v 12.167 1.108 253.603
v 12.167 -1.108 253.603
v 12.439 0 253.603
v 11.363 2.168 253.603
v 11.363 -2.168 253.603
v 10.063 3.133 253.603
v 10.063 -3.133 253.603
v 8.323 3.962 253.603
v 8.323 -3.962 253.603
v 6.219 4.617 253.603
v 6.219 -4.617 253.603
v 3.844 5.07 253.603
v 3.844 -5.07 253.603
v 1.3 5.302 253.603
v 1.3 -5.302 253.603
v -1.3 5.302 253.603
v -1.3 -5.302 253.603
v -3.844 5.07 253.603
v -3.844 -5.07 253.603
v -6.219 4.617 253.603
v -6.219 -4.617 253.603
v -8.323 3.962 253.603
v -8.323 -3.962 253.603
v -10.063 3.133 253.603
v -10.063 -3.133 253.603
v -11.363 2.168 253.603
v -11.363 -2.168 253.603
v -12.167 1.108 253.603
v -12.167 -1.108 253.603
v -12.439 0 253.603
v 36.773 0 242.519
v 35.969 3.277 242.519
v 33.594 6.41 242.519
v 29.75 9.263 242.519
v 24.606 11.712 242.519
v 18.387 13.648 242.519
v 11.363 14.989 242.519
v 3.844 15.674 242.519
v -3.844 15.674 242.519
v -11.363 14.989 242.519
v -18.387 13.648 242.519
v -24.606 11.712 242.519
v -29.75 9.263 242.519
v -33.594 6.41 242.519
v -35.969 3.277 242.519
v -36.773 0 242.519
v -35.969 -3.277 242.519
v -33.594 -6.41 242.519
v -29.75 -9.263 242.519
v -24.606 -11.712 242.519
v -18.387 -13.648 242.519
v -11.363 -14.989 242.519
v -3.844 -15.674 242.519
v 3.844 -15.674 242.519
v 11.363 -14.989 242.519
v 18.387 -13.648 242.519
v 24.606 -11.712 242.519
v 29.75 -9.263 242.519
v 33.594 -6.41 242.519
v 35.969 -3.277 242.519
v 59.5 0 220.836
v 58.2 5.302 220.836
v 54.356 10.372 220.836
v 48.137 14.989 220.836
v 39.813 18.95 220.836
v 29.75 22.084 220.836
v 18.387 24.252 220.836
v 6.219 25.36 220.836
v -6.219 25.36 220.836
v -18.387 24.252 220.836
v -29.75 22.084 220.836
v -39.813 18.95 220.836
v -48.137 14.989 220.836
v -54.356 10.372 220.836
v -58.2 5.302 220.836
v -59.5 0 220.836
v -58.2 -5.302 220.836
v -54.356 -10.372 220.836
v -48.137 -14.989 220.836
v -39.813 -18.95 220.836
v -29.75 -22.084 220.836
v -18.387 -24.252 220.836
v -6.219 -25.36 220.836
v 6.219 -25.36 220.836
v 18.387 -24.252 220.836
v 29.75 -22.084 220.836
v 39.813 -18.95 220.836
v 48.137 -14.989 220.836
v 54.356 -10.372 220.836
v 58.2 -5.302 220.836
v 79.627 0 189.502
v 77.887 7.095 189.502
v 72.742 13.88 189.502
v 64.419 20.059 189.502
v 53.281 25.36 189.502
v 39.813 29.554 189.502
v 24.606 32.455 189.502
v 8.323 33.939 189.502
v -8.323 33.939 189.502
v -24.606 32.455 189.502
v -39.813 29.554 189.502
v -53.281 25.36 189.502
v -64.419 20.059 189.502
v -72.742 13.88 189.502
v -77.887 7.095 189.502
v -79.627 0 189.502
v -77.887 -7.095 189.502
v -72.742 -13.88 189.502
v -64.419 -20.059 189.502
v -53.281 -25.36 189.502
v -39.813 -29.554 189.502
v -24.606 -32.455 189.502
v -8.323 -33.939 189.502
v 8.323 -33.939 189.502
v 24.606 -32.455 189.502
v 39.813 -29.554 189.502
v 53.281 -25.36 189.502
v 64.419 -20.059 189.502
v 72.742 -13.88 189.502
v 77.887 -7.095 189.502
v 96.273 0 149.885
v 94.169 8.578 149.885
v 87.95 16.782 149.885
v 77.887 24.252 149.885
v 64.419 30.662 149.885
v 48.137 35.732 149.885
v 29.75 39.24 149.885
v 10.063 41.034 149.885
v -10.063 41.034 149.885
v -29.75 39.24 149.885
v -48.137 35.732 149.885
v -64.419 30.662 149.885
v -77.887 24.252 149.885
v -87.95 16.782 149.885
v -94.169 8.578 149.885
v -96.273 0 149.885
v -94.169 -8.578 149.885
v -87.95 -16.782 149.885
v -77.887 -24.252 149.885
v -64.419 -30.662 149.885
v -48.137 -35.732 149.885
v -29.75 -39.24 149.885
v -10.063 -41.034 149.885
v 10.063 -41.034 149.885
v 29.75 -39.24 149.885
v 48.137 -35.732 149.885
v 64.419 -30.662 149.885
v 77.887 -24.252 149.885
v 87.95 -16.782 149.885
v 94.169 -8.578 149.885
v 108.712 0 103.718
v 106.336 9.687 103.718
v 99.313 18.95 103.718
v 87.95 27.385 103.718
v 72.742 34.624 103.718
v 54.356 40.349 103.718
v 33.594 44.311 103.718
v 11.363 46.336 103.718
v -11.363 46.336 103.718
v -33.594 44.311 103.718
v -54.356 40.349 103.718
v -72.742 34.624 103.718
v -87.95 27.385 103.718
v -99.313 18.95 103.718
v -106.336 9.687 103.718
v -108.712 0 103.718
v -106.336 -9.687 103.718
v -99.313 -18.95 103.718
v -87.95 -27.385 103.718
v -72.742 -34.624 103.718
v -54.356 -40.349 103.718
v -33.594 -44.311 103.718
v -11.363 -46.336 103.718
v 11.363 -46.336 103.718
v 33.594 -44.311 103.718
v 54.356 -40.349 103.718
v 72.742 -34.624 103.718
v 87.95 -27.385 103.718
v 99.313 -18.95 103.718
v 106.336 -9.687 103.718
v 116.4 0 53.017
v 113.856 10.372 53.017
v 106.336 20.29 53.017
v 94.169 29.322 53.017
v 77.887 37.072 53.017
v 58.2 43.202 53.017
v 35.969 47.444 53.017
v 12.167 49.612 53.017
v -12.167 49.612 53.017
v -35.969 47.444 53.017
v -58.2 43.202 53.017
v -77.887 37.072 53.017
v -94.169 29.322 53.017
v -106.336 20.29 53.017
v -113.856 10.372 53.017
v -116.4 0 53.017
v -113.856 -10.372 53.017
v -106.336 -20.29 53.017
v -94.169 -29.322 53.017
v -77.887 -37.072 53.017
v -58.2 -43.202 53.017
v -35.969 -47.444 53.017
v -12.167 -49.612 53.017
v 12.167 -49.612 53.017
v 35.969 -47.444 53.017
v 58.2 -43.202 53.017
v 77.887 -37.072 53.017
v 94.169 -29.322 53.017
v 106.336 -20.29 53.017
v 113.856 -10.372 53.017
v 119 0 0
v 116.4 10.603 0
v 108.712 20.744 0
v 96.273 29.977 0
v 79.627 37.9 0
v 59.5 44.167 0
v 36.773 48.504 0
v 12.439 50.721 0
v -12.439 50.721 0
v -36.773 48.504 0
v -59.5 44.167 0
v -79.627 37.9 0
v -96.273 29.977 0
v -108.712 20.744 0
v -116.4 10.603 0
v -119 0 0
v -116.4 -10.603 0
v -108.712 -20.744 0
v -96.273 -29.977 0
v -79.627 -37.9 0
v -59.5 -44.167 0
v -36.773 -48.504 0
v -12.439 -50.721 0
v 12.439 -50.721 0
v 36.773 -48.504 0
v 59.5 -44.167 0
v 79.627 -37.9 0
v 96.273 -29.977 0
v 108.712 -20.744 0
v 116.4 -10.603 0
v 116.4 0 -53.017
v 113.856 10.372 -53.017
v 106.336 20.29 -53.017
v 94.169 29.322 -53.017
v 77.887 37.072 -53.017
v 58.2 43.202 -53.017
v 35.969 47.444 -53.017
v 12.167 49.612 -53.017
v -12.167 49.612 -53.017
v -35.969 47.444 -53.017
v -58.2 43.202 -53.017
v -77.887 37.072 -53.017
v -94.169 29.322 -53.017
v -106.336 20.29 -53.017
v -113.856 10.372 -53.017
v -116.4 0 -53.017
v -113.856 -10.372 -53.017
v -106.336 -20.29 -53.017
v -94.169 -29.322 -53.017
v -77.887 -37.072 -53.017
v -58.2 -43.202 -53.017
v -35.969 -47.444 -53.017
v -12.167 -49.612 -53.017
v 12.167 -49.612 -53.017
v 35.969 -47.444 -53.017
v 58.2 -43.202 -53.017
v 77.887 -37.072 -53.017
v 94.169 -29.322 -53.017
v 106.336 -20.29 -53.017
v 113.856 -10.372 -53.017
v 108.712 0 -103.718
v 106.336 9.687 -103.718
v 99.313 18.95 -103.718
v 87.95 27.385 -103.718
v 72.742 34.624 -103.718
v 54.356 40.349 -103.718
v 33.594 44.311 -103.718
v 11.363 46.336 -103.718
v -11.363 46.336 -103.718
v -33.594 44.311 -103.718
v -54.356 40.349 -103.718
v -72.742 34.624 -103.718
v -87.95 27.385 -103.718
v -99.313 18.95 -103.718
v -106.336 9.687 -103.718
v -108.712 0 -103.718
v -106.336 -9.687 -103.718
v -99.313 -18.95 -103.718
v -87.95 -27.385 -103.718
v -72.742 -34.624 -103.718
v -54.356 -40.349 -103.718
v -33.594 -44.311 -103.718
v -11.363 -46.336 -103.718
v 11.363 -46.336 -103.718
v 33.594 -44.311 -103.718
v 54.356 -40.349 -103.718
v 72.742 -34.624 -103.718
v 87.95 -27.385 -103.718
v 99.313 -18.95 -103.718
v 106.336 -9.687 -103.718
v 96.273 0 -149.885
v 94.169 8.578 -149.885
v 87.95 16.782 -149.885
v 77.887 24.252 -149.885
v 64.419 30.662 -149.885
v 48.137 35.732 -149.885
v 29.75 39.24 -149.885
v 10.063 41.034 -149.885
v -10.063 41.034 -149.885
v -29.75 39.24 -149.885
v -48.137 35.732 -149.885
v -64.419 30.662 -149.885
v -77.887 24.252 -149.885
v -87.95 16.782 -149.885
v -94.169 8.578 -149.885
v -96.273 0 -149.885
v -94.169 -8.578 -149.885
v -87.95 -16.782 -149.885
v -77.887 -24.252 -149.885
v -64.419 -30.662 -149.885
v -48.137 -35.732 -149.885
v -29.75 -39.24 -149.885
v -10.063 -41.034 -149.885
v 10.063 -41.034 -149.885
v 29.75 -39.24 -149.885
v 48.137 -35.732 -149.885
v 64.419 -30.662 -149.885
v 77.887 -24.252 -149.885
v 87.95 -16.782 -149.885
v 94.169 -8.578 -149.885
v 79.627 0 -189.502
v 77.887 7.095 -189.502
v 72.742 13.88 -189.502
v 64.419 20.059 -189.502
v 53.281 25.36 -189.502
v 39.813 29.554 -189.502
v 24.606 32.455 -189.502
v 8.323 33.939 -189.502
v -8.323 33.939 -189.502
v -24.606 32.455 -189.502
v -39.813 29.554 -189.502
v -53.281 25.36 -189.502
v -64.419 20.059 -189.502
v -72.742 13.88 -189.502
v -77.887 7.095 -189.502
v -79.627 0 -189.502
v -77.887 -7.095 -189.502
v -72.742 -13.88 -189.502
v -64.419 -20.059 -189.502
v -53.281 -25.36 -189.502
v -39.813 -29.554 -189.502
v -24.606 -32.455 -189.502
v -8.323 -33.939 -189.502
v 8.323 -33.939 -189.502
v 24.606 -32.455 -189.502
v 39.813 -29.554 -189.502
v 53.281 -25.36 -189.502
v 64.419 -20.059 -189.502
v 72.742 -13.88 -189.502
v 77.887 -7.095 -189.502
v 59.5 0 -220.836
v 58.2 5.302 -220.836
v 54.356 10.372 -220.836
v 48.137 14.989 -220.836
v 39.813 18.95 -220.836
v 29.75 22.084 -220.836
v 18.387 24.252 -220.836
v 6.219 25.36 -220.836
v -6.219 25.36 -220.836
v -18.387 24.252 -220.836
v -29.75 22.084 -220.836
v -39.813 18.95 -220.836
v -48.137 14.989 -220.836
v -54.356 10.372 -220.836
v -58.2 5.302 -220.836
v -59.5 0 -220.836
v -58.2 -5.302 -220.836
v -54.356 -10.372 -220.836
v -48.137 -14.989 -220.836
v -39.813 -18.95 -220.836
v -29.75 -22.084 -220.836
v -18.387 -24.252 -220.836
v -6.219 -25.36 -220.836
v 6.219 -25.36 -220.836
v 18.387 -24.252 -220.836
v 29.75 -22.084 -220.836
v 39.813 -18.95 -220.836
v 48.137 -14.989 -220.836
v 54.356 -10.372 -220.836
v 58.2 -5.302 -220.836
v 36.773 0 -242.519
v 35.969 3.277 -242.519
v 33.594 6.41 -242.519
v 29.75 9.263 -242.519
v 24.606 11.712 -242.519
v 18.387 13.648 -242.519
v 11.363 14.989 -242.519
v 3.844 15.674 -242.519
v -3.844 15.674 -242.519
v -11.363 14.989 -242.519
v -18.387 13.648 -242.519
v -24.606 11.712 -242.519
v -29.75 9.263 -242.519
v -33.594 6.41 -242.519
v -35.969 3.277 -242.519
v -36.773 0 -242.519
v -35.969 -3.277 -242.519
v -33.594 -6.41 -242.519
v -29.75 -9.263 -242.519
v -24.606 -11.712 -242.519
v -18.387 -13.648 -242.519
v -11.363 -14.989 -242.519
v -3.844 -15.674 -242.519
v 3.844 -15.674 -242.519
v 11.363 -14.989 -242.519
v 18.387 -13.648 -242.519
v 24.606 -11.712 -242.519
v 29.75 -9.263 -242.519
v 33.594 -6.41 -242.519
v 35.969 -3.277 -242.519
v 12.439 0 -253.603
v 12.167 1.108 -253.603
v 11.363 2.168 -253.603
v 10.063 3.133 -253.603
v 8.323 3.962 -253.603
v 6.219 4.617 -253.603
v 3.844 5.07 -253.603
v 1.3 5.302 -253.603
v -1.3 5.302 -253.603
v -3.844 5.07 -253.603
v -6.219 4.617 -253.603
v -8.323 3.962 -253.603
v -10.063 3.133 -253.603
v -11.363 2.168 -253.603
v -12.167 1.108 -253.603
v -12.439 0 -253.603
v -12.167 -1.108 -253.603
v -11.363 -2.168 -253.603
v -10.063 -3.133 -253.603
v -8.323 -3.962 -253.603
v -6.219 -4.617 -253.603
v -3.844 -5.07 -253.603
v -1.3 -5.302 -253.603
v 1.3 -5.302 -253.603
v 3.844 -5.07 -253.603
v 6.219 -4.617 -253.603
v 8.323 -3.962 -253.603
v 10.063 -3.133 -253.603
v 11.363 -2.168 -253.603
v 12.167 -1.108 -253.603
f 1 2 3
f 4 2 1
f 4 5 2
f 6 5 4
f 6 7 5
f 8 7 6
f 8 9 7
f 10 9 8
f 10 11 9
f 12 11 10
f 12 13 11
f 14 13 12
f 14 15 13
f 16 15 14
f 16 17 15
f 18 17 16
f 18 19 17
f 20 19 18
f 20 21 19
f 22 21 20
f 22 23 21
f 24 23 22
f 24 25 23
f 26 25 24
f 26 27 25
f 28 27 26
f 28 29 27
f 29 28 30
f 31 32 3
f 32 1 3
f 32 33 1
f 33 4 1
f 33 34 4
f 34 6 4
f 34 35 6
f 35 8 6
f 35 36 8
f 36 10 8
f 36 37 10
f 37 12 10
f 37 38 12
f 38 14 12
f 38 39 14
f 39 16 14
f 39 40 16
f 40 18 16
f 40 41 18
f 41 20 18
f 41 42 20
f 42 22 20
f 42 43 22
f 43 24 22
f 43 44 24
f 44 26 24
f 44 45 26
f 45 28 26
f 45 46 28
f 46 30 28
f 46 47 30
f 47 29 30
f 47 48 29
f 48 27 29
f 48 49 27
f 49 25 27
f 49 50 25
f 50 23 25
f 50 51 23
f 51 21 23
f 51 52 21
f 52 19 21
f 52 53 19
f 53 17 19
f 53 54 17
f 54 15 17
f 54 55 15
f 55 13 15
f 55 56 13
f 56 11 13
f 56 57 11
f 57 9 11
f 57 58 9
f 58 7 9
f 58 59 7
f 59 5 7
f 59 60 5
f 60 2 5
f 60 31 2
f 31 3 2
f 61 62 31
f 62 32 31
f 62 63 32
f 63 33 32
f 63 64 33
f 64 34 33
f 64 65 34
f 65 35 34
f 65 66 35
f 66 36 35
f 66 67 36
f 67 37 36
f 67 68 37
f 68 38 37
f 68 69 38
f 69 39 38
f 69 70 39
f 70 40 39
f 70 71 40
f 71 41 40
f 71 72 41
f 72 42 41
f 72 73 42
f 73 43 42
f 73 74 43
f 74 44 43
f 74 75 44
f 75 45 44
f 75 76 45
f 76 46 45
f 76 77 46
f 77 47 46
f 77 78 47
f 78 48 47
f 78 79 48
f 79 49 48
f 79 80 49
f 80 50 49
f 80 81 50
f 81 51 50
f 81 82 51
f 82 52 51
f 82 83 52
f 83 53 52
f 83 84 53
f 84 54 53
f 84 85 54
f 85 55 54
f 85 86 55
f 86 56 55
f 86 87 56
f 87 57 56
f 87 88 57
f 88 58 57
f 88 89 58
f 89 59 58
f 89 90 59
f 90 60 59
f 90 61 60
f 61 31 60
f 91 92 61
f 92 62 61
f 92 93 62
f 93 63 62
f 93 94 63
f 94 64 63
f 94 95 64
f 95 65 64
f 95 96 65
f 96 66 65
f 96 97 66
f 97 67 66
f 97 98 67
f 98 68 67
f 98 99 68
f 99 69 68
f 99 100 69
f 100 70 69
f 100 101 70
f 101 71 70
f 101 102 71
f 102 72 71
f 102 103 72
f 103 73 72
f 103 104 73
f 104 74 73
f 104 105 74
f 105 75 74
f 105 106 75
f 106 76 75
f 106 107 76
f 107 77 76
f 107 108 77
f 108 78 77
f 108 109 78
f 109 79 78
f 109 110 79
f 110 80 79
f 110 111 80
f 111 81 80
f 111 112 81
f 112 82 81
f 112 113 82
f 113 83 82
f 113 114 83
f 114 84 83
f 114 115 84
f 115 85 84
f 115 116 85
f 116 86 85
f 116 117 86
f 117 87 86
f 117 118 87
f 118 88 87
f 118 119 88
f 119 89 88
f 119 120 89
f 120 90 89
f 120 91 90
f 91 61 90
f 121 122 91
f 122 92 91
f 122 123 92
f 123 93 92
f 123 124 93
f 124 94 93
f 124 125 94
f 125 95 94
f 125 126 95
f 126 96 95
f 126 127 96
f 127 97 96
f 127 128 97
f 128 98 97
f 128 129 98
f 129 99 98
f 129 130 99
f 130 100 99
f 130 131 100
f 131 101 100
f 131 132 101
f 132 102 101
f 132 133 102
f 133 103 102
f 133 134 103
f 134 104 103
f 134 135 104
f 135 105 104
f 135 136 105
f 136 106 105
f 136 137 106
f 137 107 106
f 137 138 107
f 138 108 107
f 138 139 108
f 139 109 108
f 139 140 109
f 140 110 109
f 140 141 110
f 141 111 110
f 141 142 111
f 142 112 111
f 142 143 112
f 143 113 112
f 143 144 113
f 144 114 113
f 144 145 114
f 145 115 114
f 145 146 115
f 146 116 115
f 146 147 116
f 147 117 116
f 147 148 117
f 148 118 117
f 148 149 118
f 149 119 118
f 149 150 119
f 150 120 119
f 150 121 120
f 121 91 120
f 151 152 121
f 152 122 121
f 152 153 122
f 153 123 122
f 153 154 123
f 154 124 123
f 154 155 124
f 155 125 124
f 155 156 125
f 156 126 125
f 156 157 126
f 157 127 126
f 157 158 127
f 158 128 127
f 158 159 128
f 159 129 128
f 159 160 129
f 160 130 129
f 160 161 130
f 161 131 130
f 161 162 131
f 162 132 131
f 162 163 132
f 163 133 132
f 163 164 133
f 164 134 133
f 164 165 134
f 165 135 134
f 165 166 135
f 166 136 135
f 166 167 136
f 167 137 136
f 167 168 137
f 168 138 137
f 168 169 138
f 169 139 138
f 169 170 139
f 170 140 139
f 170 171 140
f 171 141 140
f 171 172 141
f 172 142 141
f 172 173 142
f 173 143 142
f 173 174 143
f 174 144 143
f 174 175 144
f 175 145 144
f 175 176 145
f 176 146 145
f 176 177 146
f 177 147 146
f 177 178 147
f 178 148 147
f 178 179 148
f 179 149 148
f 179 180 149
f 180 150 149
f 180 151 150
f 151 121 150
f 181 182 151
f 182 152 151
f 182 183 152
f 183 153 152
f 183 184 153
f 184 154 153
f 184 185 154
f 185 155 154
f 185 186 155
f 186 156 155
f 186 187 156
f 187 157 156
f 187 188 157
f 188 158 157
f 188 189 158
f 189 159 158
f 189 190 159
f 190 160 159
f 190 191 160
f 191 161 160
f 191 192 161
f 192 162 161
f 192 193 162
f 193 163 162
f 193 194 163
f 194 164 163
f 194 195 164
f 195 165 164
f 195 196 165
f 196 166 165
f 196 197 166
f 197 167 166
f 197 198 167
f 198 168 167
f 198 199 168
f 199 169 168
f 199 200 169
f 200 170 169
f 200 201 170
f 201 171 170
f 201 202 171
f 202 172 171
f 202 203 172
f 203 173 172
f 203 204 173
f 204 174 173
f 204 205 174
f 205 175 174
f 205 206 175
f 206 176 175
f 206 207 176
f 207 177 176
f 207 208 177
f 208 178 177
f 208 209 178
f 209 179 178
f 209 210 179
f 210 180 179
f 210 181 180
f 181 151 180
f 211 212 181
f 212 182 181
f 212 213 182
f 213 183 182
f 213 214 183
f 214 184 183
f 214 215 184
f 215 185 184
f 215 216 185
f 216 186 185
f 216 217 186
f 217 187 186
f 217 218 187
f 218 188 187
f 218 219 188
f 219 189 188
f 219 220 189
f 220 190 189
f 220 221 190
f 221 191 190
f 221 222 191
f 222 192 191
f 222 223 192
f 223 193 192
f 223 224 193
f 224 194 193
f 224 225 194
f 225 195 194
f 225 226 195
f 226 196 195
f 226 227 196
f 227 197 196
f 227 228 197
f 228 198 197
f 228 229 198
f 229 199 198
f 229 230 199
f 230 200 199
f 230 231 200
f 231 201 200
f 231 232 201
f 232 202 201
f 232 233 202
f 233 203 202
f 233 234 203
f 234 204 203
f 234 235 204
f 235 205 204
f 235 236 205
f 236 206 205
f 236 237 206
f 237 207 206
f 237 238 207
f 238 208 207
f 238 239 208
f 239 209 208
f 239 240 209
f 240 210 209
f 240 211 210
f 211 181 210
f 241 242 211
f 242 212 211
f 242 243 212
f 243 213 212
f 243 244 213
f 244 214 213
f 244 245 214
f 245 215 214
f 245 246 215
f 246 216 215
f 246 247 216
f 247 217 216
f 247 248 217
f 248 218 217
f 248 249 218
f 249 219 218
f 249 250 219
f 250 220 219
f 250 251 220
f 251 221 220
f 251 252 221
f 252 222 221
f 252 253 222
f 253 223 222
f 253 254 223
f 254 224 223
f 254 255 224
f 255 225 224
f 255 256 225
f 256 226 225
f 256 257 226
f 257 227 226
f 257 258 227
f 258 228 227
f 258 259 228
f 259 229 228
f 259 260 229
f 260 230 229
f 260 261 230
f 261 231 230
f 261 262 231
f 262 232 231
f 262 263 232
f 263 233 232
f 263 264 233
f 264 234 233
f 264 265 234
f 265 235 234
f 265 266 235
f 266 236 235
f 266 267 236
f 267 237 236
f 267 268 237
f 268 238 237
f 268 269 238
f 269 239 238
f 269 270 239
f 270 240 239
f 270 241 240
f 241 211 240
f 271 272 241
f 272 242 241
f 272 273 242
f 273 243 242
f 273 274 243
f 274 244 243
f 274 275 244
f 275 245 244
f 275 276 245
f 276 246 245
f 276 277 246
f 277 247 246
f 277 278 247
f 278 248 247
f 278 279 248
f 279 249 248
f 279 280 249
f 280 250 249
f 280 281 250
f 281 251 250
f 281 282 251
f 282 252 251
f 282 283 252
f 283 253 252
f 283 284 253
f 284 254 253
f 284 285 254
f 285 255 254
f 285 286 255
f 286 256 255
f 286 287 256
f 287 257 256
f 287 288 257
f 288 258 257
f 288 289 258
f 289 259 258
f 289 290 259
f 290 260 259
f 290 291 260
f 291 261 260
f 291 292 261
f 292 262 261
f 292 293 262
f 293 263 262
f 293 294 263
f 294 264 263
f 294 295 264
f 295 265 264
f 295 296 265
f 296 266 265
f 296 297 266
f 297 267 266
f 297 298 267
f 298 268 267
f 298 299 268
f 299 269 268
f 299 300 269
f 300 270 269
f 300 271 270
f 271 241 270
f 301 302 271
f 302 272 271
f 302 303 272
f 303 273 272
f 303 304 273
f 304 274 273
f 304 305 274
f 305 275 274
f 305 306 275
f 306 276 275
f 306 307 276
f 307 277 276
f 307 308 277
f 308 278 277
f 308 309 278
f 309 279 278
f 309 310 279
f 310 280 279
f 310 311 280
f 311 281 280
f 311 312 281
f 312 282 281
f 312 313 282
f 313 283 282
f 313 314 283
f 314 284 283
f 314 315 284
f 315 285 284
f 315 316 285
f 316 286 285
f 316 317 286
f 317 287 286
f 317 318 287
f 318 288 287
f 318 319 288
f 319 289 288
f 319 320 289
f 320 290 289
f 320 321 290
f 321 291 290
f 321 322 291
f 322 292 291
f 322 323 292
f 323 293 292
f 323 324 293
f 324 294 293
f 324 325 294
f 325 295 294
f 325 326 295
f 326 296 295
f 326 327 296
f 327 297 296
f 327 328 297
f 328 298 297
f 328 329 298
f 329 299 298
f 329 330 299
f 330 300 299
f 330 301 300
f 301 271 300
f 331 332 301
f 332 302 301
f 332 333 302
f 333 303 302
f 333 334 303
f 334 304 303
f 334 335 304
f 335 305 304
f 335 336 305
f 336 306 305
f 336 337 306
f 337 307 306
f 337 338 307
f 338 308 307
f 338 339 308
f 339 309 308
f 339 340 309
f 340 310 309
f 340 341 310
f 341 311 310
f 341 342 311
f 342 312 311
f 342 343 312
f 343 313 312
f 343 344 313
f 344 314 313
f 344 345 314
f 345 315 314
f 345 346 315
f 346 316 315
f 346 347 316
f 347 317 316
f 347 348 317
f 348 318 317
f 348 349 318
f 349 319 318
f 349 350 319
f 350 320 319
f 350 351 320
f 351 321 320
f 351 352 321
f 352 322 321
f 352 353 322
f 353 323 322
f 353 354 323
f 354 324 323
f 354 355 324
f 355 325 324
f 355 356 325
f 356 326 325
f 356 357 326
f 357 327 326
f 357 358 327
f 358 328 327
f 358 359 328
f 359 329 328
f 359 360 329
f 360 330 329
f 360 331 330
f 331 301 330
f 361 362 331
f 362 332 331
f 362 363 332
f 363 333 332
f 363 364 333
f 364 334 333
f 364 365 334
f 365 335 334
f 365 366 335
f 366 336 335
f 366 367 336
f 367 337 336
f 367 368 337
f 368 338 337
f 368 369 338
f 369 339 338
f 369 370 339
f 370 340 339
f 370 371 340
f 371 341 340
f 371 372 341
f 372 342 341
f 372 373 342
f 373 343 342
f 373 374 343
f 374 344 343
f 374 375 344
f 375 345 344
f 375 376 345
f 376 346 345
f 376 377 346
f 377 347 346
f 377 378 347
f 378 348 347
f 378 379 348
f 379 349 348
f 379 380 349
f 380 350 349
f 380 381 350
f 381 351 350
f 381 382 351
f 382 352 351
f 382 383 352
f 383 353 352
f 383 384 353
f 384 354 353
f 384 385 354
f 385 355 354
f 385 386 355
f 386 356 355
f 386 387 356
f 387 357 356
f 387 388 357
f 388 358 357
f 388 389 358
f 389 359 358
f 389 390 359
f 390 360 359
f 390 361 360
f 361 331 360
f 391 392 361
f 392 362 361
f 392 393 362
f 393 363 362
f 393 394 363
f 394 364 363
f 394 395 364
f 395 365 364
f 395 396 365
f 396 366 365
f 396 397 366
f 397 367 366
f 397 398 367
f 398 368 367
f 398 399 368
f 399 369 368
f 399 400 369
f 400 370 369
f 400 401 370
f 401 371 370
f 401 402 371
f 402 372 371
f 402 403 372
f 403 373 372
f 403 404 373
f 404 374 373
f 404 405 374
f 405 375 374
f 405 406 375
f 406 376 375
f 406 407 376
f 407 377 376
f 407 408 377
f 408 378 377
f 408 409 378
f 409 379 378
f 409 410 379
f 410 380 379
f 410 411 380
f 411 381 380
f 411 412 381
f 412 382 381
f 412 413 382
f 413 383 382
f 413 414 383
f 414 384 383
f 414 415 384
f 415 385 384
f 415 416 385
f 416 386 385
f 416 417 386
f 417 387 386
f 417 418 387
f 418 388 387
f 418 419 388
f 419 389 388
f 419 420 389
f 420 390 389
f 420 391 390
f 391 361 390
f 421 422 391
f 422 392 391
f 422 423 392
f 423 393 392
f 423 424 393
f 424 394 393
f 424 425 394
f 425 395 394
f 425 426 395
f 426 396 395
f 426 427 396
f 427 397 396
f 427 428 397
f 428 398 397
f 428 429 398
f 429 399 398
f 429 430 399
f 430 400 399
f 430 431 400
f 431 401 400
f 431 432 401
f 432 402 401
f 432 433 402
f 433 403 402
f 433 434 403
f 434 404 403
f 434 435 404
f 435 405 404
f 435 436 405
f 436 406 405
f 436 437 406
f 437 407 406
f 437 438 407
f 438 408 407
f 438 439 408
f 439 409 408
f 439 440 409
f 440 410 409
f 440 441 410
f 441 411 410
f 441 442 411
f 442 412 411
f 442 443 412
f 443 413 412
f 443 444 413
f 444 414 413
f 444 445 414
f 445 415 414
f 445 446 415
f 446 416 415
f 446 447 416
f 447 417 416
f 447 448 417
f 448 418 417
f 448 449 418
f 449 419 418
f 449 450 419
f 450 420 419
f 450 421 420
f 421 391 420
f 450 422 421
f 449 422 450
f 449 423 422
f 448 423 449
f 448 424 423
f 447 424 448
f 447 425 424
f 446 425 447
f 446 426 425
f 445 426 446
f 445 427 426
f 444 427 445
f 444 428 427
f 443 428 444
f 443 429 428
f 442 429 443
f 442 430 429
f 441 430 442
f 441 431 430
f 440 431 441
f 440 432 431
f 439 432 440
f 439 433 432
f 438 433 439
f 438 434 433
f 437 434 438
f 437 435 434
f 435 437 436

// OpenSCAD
// Generated by SolidPython 1.0.1 on 2020-07-29 00:46:47


scale(v = [7, 3, 15]) {
	sphere(r = 17);
}
/***********************************************
*********      SolidPython code:      **********
************************************************
 
# import packages: SolidPython
from solid import *
from solid.utils import *
from itertools import chain, combinations, permutations


class Resize:

    def __init__(self, scad_file):
        self.scad_file = scad_file
        #self.scad_file = import_scad(scad_file)
        # cone/cylinder param:
        self.r1 = 0
        self.r2 = 0
        self.h = 0
        # rectangular prism param:
        self.w = 0
        self.l = 0
        # ellipse param:
        self.r = 0

    # import OpenScad code (file name corresponds to shape)


    # classify shape + parameters
    def assign(self, param1, param2, param3):
        if self.scad_file == 'cone.scad':
            self.r1 = param1
            self.r2 = param2
            self.h = param3
        elif self.scad_file == 'cylinder.scad':
            self.r1 = param1
            self.r2 = param2
            self.h = param3
        elif self.scad_file == 'rectangularPrism.scad':
            self.h = param1
            self.l = param2
            self.w = param3
        else:
            self.r = param1
            self.h = param2

    # resize parameters
    def iterate(self):
        x = range(3, 20, 2)
        i = 1
        if self.scad_file == 'cone.scad':
            tempList = list(permutations(x, 2))
            for temp in tempList:
                param1 = temp[0]
                param2 = temp[1]
                filepath = 'produced_scad_files/' + 'cone' + str(param1) + '_' + str(param2) + '_' + '.scad'
                scad_render_to_file(cylinder(h=param1, r1=param2, r2=0), filepath)

        elif self.scad_file == 'cylinder.scad':
            tempList = list(permutations(x, 3))
            for temp in tempList:
                param1 = temp[0]
                param2 = temp[1]
                filepath = 'produced_scad_files/' + 'cylinder' + str(param1) + '_' + str(param2) + '_' + '.scad'
                scad_render_to_file(cylinder(h=param1, r1=param2, r2=param2), filepath)

        elif self.scad_file == 'rectangularPrism.scad':
            tempList = list(permutations(x, 3))
            for temp in tempList:
                param1 = temp[0]
                param2 = temp[1]
                param3 = temp[2]
                filepath = 'produced_scad_files/' + 'rectangularPrism' + str(param1) + '_' + str(param2) + '_' + str(
                    param3) + '.scad'
                scad_render_to_file(cube(size=(param1, param2, param3)), filepath)

        elif self.scad_file == 'ellipse.scad':
            tempList = list(permutations(x, 4))
            for temp in tempList:
                param1 = temp[0]
                param2 = temp[1]
                param3 = temp[2]
                param4 = temp[3]
                filepath = 'produced_scad_files/' + 'ellipse' + str(param1) + '_' + str(param2) + '_' + str(param3) + '_' + str(param4) + '.scad'
                scad_render_to_file(scale([param1, param2, param3])(sphere(r=param4)), filepath)

    def render_to_scadfile(self):
        scad_render_to_file(scad, 'example.scad') 
 
************************************************/
